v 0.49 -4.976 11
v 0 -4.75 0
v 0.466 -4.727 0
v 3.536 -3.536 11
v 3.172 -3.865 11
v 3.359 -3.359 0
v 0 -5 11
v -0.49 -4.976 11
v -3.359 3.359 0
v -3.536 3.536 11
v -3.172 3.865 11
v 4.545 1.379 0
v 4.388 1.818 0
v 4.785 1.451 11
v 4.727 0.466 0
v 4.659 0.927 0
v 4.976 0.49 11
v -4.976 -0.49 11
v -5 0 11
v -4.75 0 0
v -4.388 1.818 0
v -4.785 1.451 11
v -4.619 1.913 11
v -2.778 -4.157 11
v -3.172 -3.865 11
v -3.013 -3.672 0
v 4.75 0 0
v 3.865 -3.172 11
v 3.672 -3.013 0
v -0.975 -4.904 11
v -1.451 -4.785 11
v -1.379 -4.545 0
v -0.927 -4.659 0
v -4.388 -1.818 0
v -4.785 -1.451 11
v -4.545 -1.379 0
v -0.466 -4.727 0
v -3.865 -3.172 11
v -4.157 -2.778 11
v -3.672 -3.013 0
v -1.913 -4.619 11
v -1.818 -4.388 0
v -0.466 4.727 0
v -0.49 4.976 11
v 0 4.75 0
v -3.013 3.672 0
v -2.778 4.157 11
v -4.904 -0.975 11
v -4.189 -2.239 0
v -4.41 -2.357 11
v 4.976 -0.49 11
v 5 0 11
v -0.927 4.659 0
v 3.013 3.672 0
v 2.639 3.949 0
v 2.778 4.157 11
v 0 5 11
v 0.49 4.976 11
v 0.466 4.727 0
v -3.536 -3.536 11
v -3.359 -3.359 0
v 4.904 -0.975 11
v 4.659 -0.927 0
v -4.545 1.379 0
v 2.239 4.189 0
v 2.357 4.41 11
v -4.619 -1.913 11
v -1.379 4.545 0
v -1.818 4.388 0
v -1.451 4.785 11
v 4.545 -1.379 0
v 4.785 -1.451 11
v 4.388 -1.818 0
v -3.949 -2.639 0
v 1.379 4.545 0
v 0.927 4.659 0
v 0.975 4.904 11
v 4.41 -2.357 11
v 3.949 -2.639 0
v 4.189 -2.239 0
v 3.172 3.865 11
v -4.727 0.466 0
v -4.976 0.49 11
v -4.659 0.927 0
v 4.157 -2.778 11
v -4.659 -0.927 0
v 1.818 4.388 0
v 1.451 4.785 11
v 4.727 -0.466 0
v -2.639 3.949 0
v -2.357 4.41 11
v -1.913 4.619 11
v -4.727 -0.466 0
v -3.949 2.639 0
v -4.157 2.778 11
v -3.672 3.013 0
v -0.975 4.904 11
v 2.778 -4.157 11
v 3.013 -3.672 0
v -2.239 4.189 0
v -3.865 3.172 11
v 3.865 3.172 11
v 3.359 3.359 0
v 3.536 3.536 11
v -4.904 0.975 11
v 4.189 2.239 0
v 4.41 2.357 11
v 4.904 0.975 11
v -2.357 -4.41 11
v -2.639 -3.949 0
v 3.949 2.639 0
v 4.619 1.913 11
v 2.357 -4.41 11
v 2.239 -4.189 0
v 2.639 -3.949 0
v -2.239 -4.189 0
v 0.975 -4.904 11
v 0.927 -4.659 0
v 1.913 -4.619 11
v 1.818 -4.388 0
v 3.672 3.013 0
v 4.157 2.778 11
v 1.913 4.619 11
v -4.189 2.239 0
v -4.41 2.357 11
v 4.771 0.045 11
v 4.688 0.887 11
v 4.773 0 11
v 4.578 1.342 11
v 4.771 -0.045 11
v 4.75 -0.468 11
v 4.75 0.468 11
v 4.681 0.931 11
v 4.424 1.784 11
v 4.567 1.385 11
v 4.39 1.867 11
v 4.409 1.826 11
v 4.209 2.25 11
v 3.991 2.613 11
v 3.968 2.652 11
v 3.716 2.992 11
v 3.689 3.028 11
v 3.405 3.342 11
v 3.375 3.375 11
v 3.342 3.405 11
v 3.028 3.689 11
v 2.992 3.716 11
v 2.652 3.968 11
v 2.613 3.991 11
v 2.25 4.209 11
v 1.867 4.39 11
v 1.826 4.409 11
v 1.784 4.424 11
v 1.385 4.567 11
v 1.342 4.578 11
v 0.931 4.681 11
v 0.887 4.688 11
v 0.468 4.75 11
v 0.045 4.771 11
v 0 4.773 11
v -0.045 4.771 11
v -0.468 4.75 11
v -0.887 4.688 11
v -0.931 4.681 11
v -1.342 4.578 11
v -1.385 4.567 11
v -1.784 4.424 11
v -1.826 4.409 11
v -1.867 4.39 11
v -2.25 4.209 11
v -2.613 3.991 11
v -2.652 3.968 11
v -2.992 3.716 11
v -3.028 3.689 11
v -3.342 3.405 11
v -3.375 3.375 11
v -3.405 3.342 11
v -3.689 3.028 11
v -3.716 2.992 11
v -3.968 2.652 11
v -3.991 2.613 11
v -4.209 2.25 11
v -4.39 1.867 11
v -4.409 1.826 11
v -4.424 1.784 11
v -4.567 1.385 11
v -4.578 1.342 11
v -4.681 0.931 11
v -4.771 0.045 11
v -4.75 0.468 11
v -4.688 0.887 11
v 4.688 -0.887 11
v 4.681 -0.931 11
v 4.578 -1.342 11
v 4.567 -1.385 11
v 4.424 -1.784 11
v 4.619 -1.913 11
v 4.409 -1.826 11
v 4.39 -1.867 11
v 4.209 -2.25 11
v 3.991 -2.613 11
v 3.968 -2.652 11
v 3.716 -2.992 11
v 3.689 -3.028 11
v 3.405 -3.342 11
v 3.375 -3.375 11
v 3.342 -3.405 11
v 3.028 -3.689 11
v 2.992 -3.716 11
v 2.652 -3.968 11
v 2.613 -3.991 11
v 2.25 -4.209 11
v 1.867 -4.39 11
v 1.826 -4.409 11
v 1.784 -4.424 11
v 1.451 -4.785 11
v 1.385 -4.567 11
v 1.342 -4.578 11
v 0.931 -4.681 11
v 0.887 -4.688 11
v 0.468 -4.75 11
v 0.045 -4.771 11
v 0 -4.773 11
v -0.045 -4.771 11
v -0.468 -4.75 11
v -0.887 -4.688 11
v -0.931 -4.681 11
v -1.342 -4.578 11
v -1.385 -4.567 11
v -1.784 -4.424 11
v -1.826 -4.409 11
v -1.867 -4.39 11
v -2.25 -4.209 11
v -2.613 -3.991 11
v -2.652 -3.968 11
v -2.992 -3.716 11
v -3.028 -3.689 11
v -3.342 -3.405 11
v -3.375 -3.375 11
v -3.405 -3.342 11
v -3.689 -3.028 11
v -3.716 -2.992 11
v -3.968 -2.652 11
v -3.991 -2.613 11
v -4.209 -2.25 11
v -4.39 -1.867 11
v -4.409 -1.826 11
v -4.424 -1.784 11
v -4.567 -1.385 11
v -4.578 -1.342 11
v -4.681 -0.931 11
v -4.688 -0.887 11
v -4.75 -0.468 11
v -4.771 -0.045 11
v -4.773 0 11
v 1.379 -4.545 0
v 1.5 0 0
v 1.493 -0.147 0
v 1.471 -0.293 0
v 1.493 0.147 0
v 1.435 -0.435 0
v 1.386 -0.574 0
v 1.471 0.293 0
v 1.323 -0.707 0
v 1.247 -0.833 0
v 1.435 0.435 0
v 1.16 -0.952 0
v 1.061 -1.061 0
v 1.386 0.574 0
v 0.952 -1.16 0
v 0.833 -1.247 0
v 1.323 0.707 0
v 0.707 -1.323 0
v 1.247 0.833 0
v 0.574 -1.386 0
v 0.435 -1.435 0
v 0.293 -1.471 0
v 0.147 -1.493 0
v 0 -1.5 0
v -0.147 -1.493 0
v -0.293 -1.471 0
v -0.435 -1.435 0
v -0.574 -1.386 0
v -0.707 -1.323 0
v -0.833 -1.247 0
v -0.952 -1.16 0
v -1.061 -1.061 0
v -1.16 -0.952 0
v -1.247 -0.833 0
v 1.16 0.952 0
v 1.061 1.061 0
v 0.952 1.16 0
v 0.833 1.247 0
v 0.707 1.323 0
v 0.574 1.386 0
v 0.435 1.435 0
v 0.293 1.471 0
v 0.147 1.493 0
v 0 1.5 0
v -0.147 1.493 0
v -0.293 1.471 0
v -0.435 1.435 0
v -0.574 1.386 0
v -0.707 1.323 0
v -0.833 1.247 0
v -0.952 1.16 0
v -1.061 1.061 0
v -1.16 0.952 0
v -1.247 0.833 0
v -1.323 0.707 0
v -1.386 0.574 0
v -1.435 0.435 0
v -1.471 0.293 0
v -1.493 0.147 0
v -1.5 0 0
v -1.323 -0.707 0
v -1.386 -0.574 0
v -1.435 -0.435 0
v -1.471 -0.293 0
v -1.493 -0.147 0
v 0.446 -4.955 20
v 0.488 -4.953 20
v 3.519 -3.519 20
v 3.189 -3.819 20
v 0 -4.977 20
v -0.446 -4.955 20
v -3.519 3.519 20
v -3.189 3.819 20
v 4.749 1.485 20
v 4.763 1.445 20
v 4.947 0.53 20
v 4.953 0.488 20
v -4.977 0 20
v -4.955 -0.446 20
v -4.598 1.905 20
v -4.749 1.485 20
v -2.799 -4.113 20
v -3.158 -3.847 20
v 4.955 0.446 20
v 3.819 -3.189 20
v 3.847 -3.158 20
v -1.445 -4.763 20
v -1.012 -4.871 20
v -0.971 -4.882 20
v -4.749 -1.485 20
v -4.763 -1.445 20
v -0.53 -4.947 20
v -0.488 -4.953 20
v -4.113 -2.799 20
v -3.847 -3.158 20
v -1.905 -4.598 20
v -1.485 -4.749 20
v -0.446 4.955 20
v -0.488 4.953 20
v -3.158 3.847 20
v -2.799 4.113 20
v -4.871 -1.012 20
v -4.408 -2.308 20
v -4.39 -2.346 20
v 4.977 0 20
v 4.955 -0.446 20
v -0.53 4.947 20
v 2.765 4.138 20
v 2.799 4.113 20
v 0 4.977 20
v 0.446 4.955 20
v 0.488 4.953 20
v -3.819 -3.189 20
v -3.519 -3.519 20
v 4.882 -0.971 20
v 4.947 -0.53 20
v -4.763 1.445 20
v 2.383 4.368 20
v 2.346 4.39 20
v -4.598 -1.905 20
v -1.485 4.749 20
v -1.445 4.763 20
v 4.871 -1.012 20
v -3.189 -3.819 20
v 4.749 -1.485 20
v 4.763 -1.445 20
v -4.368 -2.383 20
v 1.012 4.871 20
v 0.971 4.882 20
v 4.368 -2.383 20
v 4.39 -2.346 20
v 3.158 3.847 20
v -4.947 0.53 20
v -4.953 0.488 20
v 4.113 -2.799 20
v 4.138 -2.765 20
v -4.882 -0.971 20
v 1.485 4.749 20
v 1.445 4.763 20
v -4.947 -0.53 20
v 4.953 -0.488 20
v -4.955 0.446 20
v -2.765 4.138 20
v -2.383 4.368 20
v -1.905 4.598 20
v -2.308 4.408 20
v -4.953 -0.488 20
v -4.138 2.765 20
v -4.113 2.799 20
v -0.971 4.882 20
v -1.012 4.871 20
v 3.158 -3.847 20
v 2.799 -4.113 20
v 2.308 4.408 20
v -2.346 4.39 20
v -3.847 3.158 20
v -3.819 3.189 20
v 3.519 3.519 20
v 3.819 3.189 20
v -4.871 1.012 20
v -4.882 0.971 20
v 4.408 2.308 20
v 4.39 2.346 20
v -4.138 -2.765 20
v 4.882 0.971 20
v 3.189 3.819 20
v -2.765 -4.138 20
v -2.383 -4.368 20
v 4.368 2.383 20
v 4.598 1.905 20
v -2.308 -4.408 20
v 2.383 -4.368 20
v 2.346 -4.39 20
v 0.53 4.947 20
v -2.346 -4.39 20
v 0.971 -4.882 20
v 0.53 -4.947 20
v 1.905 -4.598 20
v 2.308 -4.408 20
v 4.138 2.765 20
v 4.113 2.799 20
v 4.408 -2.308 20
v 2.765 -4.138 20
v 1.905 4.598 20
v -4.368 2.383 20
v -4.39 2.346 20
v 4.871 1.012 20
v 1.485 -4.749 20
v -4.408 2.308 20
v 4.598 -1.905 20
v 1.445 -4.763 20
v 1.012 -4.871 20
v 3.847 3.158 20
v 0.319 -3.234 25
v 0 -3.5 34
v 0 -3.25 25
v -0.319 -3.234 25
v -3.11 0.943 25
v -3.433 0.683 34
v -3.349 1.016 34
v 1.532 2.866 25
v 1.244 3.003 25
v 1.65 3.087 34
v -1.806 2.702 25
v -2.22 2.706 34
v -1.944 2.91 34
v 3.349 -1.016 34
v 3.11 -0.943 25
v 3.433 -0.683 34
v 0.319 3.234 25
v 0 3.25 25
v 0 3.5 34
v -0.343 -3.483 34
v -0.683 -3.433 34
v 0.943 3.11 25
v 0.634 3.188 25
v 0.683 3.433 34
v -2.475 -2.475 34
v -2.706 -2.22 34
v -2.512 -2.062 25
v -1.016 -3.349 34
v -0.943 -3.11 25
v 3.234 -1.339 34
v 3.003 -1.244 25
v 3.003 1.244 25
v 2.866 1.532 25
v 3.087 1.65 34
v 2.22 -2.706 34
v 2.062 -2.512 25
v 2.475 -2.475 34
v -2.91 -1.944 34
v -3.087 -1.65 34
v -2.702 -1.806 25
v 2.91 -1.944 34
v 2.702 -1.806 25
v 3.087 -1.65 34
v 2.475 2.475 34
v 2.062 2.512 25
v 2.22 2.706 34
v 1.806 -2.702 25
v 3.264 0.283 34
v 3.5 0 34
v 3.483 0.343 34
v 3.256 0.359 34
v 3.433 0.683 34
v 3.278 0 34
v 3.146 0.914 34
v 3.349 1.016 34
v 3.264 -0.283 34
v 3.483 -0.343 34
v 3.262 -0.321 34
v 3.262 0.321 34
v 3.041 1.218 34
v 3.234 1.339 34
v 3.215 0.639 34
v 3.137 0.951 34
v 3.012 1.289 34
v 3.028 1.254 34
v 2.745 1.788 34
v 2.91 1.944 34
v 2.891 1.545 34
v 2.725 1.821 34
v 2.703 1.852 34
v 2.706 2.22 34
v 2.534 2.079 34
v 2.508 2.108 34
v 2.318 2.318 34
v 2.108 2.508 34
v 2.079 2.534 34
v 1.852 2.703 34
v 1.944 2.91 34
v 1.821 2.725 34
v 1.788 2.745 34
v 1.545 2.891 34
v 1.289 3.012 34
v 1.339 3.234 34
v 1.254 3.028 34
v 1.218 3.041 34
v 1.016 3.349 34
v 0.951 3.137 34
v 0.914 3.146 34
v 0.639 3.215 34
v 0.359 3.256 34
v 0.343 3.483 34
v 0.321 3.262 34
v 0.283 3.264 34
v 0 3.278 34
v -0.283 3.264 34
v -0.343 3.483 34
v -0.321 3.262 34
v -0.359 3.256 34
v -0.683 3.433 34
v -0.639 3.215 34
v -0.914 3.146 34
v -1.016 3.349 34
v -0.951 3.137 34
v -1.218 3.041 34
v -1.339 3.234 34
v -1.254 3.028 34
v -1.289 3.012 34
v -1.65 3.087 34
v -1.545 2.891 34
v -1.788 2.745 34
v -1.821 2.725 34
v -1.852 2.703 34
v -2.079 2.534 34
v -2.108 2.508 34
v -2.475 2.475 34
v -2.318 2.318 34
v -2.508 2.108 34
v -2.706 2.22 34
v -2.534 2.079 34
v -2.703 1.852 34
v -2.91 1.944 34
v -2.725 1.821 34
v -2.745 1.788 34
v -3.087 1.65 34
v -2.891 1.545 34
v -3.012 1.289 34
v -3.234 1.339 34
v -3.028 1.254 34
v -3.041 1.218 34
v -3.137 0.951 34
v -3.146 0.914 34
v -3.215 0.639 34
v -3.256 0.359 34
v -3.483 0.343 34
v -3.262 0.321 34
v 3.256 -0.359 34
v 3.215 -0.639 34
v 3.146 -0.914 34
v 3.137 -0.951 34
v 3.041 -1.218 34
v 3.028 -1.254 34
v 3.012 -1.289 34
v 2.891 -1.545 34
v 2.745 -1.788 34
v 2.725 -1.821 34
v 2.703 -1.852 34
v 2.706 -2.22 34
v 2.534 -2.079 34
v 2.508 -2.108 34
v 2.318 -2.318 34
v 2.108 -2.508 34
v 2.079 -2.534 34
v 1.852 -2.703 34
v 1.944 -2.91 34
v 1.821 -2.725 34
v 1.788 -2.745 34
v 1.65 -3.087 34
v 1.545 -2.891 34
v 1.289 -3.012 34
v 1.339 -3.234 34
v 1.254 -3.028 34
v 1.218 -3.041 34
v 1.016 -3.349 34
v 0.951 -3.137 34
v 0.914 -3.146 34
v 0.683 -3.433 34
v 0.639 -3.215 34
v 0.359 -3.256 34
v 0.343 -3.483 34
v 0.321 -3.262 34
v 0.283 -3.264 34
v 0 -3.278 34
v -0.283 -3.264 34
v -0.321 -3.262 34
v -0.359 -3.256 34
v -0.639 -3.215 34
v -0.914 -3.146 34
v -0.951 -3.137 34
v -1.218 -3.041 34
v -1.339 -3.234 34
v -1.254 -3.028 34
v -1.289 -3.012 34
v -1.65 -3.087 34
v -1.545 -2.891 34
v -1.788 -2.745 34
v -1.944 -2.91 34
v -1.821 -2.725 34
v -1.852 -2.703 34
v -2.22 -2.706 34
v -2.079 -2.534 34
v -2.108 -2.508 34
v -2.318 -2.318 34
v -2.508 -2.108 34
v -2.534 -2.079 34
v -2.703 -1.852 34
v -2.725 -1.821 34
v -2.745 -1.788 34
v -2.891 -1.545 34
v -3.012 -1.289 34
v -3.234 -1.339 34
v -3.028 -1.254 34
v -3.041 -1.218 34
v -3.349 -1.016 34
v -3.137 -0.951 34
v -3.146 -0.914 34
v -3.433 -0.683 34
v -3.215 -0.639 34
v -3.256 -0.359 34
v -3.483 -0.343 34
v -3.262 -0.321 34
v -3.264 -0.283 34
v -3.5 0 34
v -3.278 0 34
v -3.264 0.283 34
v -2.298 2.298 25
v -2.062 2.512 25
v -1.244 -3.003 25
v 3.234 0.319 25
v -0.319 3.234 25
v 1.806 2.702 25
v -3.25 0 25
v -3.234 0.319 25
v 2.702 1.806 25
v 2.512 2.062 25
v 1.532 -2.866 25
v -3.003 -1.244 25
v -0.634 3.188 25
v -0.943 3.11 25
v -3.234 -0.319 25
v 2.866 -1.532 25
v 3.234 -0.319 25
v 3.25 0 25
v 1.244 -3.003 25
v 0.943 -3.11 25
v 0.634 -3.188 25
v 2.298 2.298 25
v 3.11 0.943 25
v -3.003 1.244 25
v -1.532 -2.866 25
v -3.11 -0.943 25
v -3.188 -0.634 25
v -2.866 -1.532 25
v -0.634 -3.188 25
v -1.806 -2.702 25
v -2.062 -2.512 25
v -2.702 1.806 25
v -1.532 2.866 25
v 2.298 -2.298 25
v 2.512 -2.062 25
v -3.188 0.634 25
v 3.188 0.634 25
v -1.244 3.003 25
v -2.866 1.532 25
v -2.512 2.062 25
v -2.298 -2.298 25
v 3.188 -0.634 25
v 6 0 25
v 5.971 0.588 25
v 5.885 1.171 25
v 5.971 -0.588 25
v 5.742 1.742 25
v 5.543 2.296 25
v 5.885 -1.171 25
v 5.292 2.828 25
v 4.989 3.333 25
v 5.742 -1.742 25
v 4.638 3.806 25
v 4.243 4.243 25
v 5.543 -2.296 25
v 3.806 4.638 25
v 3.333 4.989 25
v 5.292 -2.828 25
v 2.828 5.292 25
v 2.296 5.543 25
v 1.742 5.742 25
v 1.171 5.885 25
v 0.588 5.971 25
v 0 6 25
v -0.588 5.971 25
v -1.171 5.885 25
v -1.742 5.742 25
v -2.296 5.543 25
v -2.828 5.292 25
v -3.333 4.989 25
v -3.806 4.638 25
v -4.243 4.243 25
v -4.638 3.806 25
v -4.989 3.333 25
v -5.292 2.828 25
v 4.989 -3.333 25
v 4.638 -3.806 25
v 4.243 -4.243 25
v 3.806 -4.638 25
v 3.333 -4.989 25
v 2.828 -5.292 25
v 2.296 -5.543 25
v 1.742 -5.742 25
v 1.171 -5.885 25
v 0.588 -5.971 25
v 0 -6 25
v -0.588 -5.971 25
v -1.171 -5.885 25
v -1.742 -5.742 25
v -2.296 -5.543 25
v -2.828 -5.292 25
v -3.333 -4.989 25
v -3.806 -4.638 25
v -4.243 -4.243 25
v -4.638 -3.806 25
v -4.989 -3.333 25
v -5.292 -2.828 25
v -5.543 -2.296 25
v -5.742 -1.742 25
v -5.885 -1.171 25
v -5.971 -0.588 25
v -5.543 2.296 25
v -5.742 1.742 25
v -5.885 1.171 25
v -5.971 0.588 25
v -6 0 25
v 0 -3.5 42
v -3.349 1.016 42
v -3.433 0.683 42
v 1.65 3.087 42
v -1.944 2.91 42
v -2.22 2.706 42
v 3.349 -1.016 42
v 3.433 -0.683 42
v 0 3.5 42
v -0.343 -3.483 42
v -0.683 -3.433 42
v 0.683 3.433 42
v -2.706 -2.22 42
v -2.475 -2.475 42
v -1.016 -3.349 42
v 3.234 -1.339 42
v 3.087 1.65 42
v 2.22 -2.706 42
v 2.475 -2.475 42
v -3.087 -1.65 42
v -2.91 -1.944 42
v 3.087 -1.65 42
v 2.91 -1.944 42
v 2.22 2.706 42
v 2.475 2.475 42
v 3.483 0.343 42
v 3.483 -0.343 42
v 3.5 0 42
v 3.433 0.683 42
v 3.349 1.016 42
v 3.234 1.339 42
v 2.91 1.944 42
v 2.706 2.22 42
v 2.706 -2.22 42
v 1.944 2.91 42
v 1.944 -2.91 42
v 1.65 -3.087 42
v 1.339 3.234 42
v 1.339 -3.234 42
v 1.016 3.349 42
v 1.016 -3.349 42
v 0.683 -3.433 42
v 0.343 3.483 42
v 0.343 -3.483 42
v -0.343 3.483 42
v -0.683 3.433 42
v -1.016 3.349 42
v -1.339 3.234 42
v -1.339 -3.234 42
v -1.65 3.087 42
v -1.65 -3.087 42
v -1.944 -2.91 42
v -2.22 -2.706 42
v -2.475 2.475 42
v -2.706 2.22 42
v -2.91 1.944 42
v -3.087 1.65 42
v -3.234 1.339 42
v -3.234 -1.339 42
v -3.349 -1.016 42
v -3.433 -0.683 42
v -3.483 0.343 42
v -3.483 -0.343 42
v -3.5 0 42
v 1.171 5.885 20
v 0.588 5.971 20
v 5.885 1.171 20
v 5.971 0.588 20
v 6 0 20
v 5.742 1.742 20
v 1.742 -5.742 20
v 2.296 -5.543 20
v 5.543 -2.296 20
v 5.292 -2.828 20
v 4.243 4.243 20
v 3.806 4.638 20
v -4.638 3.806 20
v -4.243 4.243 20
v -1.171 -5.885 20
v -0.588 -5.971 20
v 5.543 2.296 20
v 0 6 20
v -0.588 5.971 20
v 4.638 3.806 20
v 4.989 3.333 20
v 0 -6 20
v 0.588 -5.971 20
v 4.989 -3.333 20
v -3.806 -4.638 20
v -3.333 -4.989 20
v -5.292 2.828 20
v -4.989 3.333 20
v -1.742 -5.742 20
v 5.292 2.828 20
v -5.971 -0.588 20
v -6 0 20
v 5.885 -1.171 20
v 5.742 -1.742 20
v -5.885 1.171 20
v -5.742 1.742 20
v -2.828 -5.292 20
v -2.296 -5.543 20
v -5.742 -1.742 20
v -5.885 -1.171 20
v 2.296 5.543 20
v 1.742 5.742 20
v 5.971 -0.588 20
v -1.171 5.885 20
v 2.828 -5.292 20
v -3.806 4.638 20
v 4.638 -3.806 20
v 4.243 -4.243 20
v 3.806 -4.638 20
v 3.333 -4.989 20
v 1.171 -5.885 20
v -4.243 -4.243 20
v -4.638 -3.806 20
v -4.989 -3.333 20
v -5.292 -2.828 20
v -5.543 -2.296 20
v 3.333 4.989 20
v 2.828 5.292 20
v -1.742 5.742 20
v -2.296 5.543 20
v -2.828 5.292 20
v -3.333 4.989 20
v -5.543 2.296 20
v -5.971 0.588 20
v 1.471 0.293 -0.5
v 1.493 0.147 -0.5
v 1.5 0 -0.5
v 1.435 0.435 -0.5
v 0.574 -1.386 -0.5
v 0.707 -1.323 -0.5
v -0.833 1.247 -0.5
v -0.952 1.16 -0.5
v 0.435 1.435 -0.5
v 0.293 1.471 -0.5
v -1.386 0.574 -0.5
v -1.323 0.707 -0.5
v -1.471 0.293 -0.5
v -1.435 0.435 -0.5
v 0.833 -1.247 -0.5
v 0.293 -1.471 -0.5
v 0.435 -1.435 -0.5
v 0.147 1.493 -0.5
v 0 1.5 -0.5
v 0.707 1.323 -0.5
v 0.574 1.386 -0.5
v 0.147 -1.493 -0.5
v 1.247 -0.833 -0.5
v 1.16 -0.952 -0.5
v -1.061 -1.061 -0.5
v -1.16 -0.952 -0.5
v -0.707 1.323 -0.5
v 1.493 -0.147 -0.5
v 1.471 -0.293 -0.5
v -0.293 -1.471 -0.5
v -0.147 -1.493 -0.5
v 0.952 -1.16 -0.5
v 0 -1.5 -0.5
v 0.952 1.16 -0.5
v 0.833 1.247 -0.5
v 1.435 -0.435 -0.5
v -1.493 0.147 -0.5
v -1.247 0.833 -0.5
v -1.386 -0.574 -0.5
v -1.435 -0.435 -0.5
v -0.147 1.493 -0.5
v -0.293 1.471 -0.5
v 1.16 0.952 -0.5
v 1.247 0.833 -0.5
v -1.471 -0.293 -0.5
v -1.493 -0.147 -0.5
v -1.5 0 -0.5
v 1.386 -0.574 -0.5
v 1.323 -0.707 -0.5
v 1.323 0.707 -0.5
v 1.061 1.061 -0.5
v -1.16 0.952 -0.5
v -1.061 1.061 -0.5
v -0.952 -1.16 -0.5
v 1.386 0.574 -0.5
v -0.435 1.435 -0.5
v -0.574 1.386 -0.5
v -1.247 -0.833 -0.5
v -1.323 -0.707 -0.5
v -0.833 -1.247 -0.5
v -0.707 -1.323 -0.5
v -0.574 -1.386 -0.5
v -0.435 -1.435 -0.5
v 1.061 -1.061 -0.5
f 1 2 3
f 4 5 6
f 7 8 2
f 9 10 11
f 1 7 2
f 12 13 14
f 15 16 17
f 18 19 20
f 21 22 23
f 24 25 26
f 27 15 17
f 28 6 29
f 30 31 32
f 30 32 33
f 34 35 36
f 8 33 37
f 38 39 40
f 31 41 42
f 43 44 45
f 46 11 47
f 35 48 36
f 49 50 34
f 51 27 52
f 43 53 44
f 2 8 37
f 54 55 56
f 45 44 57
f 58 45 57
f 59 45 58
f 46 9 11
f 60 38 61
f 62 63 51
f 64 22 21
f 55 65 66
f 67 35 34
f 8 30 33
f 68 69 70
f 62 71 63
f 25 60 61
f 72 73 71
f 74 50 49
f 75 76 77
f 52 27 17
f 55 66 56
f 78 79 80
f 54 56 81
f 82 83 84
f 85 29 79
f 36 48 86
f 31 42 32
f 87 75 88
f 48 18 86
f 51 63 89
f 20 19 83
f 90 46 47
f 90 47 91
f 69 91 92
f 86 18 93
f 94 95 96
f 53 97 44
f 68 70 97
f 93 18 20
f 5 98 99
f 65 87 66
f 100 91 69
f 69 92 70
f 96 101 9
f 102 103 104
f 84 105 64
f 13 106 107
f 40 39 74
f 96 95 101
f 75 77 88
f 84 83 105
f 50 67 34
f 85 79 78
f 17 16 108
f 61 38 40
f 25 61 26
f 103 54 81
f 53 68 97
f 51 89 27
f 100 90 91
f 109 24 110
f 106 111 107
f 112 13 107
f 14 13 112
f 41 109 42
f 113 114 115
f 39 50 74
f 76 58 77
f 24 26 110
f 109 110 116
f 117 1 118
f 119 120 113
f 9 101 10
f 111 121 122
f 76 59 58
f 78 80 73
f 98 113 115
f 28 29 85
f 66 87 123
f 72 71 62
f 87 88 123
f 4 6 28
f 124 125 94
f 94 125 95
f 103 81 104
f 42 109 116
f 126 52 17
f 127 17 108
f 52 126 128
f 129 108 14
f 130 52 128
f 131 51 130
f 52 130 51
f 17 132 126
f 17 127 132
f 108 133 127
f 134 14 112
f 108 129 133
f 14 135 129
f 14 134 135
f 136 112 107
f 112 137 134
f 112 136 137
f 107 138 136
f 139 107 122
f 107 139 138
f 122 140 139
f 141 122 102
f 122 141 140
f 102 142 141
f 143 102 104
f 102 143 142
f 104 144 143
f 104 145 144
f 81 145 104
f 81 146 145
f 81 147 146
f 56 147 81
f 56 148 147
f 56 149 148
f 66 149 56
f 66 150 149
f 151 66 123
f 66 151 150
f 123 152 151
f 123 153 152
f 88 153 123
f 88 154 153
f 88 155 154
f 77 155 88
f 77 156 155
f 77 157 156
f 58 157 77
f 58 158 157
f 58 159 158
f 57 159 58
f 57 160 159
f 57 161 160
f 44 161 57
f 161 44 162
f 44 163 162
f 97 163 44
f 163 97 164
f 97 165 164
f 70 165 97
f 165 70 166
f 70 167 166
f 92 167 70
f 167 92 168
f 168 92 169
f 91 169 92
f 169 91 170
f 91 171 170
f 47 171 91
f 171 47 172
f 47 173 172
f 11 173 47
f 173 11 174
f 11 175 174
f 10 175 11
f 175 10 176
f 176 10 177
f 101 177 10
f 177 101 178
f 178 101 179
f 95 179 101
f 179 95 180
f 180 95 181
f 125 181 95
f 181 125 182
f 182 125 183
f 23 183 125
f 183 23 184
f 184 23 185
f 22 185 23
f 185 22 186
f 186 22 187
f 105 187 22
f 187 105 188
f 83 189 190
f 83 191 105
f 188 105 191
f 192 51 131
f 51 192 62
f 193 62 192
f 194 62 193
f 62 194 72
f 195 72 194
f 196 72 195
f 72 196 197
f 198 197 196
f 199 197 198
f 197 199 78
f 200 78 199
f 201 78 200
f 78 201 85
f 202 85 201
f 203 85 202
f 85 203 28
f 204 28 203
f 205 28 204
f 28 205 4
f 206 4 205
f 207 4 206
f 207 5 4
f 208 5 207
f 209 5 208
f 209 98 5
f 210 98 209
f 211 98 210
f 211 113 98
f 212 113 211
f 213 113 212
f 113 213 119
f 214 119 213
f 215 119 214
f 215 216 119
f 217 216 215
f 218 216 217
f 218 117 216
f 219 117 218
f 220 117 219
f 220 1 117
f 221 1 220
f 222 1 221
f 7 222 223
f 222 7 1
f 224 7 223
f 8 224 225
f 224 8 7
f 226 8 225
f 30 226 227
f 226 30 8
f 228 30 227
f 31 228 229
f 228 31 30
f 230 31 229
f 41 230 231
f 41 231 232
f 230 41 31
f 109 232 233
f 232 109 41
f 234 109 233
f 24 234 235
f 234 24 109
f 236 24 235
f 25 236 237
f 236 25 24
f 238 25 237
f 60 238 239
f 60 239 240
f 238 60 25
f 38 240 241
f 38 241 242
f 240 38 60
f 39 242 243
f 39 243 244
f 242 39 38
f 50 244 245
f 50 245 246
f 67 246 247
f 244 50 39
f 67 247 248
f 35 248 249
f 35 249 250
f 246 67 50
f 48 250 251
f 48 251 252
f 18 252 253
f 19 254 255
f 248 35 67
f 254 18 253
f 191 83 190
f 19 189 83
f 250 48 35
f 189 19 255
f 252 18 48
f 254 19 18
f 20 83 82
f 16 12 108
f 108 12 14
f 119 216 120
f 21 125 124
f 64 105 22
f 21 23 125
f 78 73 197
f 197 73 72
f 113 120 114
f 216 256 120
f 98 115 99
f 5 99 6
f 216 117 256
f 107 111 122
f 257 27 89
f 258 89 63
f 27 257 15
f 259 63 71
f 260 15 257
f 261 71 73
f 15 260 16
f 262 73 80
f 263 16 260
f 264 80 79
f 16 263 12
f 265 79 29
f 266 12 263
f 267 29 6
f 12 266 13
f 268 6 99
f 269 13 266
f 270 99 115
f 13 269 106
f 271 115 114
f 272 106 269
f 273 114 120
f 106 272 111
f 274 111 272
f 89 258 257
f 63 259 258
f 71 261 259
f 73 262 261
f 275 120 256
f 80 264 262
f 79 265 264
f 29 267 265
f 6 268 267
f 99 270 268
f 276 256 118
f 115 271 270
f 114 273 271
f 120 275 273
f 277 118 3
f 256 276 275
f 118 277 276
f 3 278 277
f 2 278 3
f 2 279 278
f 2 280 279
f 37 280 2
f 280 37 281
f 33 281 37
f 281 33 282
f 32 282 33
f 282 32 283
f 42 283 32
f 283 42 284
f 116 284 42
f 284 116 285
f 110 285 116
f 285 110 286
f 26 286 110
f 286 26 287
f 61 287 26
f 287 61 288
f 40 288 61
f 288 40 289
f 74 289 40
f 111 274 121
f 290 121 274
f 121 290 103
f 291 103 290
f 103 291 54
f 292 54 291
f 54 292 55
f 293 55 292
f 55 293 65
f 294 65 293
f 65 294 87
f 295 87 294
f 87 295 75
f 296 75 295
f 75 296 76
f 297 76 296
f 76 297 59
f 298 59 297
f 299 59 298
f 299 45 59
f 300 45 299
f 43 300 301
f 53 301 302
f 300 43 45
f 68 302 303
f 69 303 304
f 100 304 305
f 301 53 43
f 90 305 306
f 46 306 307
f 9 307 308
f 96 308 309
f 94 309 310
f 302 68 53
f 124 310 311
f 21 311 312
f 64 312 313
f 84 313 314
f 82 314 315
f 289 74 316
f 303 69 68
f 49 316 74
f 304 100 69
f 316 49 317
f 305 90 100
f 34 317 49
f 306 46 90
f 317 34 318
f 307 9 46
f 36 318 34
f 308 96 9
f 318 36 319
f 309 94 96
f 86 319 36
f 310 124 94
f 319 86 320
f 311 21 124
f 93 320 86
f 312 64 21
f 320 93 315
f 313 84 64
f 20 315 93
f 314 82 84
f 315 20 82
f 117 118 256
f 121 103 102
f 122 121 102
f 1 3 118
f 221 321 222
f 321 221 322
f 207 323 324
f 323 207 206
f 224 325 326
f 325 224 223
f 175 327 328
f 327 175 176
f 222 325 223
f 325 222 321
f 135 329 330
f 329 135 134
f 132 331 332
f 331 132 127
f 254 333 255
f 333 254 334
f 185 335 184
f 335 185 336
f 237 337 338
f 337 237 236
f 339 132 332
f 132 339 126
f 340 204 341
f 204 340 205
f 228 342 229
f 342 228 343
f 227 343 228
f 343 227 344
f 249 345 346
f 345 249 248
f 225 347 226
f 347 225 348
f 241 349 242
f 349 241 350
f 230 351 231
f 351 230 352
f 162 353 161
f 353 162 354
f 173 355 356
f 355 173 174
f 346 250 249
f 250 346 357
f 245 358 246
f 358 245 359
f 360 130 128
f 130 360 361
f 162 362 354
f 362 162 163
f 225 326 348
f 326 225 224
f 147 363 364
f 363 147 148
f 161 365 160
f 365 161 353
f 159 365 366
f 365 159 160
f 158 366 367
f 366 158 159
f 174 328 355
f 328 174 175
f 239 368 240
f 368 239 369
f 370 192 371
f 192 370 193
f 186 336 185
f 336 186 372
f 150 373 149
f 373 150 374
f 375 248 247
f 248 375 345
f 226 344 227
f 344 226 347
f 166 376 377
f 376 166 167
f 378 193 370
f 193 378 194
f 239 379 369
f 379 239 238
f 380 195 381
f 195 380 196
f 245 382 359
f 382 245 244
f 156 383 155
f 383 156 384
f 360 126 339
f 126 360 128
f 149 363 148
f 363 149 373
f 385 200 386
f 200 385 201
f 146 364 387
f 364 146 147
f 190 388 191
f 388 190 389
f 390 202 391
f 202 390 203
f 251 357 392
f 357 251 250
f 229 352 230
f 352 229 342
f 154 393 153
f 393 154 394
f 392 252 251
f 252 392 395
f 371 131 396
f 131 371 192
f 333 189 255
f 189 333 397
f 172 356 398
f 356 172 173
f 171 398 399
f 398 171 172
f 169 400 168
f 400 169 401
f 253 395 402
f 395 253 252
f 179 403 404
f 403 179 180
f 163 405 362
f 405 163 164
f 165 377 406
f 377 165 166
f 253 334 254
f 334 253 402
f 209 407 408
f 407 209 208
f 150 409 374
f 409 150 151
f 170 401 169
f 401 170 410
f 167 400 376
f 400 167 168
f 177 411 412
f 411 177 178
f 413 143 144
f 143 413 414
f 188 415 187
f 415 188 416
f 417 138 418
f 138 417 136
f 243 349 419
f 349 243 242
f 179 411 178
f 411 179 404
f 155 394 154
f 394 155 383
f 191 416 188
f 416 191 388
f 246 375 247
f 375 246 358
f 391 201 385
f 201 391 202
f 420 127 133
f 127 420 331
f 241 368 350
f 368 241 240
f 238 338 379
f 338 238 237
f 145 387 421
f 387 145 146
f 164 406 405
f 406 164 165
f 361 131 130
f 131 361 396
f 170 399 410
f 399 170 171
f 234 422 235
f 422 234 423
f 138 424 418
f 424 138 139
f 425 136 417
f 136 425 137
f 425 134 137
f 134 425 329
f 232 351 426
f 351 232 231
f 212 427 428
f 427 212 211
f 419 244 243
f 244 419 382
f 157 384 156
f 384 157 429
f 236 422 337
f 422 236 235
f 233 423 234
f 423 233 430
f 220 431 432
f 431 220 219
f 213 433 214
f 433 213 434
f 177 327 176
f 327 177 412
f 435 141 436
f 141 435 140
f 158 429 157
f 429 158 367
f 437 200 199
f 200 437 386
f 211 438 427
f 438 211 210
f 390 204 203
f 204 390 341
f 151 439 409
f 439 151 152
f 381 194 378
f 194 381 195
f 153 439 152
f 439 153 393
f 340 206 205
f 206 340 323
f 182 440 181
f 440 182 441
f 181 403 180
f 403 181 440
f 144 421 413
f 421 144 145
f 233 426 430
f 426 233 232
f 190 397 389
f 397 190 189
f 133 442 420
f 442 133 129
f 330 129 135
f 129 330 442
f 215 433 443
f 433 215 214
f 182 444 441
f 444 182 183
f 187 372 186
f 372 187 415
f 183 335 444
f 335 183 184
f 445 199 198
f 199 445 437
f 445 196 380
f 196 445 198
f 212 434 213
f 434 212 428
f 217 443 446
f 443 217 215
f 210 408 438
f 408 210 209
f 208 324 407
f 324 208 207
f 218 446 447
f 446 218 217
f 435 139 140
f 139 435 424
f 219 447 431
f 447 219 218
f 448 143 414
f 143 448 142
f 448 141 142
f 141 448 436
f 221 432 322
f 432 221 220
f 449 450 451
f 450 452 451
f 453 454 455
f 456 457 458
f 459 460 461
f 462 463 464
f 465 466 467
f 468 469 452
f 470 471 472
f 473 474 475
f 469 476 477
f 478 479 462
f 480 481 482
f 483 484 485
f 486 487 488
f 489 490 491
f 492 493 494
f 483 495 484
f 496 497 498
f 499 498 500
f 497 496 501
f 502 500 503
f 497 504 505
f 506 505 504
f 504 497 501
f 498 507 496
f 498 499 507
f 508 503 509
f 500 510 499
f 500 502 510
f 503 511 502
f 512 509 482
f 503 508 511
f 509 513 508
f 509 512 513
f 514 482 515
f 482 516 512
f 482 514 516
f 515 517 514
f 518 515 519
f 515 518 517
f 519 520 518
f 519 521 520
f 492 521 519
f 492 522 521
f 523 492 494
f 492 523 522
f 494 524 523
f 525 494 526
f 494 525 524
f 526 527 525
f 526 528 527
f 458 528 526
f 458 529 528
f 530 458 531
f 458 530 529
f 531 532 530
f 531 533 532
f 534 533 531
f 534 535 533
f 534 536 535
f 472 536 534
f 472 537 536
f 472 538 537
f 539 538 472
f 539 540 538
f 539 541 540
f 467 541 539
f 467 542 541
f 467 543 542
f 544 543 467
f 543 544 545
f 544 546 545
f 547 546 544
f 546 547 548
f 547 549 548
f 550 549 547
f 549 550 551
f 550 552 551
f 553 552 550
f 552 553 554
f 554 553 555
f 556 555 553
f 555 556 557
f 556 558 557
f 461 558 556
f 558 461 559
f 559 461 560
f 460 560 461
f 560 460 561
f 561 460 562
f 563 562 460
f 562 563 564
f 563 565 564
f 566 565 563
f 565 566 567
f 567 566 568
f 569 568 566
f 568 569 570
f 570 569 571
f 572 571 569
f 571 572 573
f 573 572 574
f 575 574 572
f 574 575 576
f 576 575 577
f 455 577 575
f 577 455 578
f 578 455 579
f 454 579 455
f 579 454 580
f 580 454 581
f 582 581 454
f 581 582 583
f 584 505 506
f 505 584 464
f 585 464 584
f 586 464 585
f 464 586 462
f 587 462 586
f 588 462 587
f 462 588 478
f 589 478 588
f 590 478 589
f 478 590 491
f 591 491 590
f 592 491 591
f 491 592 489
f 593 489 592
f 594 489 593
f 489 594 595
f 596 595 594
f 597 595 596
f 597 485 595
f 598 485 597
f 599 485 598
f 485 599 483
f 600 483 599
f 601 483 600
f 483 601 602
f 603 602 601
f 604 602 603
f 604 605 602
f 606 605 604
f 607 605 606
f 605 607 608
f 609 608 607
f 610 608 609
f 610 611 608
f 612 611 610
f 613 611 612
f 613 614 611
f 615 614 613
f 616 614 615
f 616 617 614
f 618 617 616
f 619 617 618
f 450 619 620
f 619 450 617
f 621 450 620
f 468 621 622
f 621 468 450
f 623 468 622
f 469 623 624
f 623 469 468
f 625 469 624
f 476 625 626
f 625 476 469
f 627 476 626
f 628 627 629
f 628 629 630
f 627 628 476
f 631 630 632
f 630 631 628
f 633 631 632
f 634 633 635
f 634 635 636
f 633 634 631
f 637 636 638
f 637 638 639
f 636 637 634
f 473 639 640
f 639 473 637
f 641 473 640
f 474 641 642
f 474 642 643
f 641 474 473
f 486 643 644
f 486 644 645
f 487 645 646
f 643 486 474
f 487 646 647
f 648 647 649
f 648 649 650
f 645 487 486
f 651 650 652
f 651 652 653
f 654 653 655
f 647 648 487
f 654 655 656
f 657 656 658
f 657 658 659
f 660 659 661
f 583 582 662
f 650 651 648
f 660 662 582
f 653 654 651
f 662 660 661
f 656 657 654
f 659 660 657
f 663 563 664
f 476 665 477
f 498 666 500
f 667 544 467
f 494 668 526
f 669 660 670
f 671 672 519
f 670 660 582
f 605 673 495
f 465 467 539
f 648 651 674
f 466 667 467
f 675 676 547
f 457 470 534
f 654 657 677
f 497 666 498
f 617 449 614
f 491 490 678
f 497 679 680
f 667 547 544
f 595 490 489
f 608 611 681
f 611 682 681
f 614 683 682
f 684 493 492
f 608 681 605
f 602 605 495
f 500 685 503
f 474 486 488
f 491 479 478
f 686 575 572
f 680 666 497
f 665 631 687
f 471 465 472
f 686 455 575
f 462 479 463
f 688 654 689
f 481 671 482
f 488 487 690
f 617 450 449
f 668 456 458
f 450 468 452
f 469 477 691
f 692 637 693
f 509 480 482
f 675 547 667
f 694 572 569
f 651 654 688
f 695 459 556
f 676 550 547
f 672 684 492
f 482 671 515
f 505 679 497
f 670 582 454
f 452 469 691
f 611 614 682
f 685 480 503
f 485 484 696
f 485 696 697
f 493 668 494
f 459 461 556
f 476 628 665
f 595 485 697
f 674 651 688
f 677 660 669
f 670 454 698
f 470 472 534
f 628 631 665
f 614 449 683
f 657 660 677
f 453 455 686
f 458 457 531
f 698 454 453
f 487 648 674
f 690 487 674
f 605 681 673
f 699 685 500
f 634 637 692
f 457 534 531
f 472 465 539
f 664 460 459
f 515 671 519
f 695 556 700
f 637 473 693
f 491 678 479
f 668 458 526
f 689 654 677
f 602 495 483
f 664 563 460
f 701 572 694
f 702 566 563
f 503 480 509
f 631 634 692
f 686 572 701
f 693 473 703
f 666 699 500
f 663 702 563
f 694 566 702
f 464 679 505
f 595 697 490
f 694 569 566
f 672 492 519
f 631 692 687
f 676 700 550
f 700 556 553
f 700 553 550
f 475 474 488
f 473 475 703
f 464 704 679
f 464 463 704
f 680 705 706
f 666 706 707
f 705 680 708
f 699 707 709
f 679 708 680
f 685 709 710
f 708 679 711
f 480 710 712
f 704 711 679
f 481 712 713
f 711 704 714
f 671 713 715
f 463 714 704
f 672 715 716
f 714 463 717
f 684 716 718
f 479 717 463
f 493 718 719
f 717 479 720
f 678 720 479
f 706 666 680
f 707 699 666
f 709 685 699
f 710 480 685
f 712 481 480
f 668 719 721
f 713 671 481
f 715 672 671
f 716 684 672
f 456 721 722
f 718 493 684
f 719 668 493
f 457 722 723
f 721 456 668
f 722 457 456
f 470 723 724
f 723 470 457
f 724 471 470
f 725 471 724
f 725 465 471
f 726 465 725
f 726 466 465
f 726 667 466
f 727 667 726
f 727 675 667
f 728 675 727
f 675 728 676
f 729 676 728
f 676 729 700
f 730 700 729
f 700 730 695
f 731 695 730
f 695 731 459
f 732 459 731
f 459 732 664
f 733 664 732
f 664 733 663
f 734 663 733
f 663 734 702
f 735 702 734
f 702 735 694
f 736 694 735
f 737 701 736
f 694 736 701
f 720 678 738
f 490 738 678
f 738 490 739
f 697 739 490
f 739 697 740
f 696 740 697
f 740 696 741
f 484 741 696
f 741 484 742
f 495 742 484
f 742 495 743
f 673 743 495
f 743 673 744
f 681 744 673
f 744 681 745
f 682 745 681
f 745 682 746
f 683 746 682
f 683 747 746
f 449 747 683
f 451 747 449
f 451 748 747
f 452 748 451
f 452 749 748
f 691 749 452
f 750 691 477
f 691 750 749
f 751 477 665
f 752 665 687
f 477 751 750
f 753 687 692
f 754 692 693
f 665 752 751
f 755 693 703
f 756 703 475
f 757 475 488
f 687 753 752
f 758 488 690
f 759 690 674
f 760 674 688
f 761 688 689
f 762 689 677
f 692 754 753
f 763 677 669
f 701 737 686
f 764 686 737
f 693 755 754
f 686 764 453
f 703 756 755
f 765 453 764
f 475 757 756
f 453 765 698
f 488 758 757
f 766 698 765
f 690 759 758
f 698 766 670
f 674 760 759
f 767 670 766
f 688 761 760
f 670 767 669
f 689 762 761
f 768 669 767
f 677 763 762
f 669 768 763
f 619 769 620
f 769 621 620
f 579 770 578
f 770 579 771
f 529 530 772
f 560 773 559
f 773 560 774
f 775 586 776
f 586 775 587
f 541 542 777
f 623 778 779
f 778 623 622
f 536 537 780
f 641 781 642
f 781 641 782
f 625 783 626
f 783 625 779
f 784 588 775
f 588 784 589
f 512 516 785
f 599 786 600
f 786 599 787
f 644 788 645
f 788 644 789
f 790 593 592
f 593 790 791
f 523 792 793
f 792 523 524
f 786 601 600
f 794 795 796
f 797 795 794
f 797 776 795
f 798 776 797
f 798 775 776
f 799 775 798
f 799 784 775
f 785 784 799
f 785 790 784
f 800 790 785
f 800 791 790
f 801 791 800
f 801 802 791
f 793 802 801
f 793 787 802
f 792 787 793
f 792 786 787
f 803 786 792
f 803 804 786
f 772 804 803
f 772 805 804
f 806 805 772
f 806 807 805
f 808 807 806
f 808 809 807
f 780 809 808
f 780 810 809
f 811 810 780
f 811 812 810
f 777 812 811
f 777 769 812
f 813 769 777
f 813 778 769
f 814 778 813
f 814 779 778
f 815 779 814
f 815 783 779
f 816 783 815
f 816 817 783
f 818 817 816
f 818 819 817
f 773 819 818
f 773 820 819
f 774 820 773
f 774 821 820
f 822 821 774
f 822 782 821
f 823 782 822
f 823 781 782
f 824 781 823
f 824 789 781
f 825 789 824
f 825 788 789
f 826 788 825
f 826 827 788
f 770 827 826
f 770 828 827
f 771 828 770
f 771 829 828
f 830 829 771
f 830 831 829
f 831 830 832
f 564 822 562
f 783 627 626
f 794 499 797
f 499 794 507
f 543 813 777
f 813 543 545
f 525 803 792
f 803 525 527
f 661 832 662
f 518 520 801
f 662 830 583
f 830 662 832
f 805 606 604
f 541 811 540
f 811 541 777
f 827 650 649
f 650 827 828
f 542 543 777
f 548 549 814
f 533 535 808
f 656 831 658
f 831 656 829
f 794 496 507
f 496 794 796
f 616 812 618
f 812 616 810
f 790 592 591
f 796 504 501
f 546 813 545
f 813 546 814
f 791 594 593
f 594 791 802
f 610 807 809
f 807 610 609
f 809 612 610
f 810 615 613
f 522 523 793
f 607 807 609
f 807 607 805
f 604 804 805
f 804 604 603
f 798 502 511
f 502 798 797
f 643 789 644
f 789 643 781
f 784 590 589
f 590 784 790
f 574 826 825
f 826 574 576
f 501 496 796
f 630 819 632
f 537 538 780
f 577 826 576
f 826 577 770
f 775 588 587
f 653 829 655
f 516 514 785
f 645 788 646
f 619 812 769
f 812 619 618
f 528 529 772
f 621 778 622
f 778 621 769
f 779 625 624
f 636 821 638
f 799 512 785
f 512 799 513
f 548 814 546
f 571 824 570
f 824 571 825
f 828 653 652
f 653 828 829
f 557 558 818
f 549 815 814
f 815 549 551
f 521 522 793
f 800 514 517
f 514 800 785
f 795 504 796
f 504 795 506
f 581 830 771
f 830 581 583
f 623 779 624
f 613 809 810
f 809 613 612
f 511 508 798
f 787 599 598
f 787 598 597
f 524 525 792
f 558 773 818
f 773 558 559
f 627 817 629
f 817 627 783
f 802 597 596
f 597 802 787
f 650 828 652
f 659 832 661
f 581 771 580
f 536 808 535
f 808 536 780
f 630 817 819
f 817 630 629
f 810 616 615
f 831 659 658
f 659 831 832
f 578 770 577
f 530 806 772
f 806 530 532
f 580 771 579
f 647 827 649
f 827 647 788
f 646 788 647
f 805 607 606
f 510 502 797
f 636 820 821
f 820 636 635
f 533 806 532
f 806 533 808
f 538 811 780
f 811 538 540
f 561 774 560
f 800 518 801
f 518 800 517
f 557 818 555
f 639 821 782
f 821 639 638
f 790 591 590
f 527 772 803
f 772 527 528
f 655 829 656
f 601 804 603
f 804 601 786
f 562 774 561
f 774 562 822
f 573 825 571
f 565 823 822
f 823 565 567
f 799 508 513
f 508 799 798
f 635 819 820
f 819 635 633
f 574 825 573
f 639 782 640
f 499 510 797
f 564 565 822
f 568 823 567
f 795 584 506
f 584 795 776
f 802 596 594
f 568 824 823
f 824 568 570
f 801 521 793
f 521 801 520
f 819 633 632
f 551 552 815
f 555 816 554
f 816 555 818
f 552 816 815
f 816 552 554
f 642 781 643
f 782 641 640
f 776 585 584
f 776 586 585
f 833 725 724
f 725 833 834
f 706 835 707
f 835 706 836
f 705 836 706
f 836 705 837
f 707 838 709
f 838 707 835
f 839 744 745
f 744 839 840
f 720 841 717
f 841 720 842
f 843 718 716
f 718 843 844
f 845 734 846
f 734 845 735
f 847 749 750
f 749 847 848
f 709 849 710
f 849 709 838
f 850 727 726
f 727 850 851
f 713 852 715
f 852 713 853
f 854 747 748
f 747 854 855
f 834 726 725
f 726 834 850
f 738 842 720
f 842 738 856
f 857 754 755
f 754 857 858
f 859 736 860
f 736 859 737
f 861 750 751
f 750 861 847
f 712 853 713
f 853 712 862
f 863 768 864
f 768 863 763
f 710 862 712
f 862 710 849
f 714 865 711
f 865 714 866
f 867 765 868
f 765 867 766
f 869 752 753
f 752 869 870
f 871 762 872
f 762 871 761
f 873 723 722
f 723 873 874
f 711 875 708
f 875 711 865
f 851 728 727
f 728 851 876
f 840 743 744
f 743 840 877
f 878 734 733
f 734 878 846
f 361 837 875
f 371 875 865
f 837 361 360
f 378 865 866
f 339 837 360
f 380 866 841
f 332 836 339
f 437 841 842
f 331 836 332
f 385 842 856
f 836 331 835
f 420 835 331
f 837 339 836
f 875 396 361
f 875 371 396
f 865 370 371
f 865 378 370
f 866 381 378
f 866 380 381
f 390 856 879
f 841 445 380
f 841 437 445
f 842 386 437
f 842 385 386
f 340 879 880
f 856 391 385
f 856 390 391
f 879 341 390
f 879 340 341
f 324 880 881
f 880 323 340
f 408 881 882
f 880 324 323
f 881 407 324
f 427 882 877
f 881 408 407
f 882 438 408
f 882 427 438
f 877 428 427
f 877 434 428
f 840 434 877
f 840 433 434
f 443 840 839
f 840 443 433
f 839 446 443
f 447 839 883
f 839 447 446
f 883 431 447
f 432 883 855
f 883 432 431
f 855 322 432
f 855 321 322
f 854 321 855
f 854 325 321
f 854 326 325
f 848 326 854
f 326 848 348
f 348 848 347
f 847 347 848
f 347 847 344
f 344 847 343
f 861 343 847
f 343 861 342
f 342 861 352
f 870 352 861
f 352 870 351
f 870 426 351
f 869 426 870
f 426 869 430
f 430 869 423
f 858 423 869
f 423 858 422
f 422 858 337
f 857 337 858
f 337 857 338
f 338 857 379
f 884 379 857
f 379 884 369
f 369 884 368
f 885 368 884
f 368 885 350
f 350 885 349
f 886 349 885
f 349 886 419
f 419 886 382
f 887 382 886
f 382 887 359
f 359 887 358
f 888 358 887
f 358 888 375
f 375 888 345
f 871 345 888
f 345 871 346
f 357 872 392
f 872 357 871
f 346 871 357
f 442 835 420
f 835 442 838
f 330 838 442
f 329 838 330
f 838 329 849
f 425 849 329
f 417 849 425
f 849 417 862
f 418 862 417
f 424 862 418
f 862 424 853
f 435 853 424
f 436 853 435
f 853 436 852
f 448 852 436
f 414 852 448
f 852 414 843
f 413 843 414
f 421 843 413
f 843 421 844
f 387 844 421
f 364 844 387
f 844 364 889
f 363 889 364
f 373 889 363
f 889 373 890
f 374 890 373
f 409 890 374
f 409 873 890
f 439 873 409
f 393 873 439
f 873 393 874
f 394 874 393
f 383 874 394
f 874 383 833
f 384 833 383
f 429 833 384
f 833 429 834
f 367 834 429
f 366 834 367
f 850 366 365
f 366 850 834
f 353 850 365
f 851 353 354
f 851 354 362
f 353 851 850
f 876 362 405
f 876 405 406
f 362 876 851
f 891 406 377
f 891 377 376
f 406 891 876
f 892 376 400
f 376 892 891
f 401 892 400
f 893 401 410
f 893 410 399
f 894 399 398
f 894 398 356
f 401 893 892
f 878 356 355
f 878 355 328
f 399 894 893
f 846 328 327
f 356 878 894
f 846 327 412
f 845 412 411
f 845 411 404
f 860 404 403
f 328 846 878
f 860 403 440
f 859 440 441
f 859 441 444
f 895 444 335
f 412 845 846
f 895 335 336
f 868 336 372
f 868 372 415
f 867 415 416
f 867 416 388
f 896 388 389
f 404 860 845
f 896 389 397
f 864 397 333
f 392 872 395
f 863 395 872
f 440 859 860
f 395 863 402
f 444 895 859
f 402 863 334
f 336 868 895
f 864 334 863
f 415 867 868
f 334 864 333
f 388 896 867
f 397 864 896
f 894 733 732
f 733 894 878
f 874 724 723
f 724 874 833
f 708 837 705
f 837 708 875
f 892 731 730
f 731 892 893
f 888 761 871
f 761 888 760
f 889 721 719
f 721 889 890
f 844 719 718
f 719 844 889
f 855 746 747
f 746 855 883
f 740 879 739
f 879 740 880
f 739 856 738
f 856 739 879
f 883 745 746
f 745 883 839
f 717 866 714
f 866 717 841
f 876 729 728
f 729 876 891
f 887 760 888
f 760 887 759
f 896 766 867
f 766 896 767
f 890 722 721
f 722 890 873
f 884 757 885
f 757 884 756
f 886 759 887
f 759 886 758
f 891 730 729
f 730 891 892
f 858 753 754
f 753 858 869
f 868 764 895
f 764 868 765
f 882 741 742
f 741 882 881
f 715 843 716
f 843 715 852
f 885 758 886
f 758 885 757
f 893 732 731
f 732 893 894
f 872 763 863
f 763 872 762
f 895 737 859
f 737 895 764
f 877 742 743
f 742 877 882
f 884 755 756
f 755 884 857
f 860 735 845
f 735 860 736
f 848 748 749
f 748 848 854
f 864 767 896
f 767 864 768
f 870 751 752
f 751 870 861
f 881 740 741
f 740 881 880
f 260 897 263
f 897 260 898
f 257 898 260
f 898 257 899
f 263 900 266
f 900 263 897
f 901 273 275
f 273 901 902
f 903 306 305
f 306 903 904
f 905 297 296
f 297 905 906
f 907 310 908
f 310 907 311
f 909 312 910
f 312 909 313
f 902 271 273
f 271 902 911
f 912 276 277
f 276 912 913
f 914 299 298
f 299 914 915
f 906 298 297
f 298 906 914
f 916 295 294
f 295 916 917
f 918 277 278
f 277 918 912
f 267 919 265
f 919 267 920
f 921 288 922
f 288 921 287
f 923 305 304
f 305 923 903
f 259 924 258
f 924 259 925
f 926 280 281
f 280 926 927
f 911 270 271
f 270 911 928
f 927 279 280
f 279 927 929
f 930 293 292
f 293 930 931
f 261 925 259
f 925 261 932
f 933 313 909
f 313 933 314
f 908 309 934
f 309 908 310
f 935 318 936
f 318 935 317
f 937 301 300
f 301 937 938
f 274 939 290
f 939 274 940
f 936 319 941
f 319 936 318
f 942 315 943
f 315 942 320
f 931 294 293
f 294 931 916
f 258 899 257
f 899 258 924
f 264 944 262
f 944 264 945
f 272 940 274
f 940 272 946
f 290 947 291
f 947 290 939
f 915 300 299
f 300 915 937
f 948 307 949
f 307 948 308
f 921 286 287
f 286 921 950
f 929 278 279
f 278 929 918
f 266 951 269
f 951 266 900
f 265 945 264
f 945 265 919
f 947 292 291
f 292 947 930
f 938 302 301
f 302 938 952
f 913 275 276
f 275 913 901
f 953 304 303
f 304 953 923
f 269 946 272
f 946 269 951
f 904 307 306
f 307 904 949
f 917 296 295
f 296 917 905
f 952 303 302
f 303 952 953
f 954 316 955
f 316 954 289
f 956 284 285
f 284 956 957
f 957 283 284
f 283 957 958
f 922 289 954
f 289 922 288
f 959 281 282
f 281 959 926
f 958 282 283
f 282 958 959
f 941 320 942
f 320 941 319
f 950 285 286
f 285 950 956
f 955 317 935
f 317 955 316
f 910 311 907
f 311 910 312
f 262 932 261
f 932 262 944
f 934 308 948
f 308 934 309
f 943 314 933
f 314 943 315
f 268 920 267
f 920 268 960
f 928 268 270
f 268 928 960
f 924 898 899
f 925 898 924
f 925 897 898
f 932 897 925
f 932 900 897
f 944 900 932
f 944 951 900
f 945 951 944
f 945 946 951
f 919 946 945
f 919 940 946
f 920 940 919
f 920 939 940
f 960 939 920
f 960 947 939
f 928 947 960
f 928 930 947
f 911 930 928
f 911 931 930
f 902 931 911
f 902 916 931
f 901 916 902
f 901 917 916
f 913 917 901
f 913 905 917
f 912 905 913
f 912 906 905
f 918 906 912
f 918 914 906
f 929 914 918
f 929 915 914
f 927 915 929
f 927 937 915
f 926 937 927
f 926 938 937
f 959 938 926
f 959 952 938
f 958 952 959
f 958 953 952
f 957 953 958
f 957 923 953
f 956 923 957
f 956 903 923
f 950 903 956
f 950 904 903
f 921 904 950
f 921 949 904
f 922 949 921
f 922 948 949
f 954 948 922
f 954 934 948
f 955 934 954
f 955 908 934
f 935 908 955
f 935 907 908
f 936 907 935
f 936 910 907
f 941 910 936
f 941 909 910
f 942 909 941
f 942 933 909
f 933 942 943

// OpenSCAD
// Hose-barb reducer: 8 mm tubing to 5 mm tubing
// Print orientation: standing upright along +Z

$fn = 64;

// ---- Dimensions (mm) ----
tube1_id     = 8;    // first tubing inner diameter
tube2_id     = 5;    // second tubing inner diameter
barb1_height = 10;   // first barb height
barb2_height = 8;    // second barb height
collar_d     = 12;   // collar outer diameter
bore         = 3;    // through-bore diameter
eps          = 0.5;  // overshoot for clean cuts

// ---- Derived ----
tube1_od = tube1_id + 1.5;   // 8 mm tubing ~ 9.5 mm outer diameter
tube2_od = tube2_id + 1.5;   // 5 mm tubing ~ 6.5 mm outer diameter
barb1_base_od = 7.5;         // first barb bottom outer diameter
barb1_top_od  = 9.5;         // first barb top outer diameter
barb2_base_od = 6.5;         // second barb bottom outer diameter
barb2_top_od  = 5.0;         // second barb top outer diameter
barb1_embed   = 0.5;         // first barb overlap into collar
barb2_embed   = 0.5;         // second barb overlap into collar

// ---- Model ----
union() {
    // First barbs (z = 0 to 20)
    for (i = [0 : 1]) {
        translate([0, 0, i * barb1_height])
            hull() {
                cylinder(h = barb1_height, d = tube1_od);
                cylinder(h = barb1_height + 2 * barb1_embed,
                         d1 = tube1_od - 0.5, d2 = tube1_od + 0.5);
            }
    }

    // Collar (z = 20 to 25)
    translate([0, 0, 20])
        cylinder(h = 5, d = collar_d);

    // Second barbs (z = 25 to 41)
    for (i = [0 : 1]) {
        translate([0, 0, 25 + i * barb2_height])
            hull() {
                cylinder(h = barb2_height, d = tube2_od);
                cylinder(h = barb2_height + 2 * barb2_embed,
                         d1 = tube2_od - 0.5, d2 = tube2_od + 0.5);
            }
    }

    // Through-bore
    translate([0, 0, -eps])
        cylinder(h = 41 + 2 * eps, d = bore);
}
